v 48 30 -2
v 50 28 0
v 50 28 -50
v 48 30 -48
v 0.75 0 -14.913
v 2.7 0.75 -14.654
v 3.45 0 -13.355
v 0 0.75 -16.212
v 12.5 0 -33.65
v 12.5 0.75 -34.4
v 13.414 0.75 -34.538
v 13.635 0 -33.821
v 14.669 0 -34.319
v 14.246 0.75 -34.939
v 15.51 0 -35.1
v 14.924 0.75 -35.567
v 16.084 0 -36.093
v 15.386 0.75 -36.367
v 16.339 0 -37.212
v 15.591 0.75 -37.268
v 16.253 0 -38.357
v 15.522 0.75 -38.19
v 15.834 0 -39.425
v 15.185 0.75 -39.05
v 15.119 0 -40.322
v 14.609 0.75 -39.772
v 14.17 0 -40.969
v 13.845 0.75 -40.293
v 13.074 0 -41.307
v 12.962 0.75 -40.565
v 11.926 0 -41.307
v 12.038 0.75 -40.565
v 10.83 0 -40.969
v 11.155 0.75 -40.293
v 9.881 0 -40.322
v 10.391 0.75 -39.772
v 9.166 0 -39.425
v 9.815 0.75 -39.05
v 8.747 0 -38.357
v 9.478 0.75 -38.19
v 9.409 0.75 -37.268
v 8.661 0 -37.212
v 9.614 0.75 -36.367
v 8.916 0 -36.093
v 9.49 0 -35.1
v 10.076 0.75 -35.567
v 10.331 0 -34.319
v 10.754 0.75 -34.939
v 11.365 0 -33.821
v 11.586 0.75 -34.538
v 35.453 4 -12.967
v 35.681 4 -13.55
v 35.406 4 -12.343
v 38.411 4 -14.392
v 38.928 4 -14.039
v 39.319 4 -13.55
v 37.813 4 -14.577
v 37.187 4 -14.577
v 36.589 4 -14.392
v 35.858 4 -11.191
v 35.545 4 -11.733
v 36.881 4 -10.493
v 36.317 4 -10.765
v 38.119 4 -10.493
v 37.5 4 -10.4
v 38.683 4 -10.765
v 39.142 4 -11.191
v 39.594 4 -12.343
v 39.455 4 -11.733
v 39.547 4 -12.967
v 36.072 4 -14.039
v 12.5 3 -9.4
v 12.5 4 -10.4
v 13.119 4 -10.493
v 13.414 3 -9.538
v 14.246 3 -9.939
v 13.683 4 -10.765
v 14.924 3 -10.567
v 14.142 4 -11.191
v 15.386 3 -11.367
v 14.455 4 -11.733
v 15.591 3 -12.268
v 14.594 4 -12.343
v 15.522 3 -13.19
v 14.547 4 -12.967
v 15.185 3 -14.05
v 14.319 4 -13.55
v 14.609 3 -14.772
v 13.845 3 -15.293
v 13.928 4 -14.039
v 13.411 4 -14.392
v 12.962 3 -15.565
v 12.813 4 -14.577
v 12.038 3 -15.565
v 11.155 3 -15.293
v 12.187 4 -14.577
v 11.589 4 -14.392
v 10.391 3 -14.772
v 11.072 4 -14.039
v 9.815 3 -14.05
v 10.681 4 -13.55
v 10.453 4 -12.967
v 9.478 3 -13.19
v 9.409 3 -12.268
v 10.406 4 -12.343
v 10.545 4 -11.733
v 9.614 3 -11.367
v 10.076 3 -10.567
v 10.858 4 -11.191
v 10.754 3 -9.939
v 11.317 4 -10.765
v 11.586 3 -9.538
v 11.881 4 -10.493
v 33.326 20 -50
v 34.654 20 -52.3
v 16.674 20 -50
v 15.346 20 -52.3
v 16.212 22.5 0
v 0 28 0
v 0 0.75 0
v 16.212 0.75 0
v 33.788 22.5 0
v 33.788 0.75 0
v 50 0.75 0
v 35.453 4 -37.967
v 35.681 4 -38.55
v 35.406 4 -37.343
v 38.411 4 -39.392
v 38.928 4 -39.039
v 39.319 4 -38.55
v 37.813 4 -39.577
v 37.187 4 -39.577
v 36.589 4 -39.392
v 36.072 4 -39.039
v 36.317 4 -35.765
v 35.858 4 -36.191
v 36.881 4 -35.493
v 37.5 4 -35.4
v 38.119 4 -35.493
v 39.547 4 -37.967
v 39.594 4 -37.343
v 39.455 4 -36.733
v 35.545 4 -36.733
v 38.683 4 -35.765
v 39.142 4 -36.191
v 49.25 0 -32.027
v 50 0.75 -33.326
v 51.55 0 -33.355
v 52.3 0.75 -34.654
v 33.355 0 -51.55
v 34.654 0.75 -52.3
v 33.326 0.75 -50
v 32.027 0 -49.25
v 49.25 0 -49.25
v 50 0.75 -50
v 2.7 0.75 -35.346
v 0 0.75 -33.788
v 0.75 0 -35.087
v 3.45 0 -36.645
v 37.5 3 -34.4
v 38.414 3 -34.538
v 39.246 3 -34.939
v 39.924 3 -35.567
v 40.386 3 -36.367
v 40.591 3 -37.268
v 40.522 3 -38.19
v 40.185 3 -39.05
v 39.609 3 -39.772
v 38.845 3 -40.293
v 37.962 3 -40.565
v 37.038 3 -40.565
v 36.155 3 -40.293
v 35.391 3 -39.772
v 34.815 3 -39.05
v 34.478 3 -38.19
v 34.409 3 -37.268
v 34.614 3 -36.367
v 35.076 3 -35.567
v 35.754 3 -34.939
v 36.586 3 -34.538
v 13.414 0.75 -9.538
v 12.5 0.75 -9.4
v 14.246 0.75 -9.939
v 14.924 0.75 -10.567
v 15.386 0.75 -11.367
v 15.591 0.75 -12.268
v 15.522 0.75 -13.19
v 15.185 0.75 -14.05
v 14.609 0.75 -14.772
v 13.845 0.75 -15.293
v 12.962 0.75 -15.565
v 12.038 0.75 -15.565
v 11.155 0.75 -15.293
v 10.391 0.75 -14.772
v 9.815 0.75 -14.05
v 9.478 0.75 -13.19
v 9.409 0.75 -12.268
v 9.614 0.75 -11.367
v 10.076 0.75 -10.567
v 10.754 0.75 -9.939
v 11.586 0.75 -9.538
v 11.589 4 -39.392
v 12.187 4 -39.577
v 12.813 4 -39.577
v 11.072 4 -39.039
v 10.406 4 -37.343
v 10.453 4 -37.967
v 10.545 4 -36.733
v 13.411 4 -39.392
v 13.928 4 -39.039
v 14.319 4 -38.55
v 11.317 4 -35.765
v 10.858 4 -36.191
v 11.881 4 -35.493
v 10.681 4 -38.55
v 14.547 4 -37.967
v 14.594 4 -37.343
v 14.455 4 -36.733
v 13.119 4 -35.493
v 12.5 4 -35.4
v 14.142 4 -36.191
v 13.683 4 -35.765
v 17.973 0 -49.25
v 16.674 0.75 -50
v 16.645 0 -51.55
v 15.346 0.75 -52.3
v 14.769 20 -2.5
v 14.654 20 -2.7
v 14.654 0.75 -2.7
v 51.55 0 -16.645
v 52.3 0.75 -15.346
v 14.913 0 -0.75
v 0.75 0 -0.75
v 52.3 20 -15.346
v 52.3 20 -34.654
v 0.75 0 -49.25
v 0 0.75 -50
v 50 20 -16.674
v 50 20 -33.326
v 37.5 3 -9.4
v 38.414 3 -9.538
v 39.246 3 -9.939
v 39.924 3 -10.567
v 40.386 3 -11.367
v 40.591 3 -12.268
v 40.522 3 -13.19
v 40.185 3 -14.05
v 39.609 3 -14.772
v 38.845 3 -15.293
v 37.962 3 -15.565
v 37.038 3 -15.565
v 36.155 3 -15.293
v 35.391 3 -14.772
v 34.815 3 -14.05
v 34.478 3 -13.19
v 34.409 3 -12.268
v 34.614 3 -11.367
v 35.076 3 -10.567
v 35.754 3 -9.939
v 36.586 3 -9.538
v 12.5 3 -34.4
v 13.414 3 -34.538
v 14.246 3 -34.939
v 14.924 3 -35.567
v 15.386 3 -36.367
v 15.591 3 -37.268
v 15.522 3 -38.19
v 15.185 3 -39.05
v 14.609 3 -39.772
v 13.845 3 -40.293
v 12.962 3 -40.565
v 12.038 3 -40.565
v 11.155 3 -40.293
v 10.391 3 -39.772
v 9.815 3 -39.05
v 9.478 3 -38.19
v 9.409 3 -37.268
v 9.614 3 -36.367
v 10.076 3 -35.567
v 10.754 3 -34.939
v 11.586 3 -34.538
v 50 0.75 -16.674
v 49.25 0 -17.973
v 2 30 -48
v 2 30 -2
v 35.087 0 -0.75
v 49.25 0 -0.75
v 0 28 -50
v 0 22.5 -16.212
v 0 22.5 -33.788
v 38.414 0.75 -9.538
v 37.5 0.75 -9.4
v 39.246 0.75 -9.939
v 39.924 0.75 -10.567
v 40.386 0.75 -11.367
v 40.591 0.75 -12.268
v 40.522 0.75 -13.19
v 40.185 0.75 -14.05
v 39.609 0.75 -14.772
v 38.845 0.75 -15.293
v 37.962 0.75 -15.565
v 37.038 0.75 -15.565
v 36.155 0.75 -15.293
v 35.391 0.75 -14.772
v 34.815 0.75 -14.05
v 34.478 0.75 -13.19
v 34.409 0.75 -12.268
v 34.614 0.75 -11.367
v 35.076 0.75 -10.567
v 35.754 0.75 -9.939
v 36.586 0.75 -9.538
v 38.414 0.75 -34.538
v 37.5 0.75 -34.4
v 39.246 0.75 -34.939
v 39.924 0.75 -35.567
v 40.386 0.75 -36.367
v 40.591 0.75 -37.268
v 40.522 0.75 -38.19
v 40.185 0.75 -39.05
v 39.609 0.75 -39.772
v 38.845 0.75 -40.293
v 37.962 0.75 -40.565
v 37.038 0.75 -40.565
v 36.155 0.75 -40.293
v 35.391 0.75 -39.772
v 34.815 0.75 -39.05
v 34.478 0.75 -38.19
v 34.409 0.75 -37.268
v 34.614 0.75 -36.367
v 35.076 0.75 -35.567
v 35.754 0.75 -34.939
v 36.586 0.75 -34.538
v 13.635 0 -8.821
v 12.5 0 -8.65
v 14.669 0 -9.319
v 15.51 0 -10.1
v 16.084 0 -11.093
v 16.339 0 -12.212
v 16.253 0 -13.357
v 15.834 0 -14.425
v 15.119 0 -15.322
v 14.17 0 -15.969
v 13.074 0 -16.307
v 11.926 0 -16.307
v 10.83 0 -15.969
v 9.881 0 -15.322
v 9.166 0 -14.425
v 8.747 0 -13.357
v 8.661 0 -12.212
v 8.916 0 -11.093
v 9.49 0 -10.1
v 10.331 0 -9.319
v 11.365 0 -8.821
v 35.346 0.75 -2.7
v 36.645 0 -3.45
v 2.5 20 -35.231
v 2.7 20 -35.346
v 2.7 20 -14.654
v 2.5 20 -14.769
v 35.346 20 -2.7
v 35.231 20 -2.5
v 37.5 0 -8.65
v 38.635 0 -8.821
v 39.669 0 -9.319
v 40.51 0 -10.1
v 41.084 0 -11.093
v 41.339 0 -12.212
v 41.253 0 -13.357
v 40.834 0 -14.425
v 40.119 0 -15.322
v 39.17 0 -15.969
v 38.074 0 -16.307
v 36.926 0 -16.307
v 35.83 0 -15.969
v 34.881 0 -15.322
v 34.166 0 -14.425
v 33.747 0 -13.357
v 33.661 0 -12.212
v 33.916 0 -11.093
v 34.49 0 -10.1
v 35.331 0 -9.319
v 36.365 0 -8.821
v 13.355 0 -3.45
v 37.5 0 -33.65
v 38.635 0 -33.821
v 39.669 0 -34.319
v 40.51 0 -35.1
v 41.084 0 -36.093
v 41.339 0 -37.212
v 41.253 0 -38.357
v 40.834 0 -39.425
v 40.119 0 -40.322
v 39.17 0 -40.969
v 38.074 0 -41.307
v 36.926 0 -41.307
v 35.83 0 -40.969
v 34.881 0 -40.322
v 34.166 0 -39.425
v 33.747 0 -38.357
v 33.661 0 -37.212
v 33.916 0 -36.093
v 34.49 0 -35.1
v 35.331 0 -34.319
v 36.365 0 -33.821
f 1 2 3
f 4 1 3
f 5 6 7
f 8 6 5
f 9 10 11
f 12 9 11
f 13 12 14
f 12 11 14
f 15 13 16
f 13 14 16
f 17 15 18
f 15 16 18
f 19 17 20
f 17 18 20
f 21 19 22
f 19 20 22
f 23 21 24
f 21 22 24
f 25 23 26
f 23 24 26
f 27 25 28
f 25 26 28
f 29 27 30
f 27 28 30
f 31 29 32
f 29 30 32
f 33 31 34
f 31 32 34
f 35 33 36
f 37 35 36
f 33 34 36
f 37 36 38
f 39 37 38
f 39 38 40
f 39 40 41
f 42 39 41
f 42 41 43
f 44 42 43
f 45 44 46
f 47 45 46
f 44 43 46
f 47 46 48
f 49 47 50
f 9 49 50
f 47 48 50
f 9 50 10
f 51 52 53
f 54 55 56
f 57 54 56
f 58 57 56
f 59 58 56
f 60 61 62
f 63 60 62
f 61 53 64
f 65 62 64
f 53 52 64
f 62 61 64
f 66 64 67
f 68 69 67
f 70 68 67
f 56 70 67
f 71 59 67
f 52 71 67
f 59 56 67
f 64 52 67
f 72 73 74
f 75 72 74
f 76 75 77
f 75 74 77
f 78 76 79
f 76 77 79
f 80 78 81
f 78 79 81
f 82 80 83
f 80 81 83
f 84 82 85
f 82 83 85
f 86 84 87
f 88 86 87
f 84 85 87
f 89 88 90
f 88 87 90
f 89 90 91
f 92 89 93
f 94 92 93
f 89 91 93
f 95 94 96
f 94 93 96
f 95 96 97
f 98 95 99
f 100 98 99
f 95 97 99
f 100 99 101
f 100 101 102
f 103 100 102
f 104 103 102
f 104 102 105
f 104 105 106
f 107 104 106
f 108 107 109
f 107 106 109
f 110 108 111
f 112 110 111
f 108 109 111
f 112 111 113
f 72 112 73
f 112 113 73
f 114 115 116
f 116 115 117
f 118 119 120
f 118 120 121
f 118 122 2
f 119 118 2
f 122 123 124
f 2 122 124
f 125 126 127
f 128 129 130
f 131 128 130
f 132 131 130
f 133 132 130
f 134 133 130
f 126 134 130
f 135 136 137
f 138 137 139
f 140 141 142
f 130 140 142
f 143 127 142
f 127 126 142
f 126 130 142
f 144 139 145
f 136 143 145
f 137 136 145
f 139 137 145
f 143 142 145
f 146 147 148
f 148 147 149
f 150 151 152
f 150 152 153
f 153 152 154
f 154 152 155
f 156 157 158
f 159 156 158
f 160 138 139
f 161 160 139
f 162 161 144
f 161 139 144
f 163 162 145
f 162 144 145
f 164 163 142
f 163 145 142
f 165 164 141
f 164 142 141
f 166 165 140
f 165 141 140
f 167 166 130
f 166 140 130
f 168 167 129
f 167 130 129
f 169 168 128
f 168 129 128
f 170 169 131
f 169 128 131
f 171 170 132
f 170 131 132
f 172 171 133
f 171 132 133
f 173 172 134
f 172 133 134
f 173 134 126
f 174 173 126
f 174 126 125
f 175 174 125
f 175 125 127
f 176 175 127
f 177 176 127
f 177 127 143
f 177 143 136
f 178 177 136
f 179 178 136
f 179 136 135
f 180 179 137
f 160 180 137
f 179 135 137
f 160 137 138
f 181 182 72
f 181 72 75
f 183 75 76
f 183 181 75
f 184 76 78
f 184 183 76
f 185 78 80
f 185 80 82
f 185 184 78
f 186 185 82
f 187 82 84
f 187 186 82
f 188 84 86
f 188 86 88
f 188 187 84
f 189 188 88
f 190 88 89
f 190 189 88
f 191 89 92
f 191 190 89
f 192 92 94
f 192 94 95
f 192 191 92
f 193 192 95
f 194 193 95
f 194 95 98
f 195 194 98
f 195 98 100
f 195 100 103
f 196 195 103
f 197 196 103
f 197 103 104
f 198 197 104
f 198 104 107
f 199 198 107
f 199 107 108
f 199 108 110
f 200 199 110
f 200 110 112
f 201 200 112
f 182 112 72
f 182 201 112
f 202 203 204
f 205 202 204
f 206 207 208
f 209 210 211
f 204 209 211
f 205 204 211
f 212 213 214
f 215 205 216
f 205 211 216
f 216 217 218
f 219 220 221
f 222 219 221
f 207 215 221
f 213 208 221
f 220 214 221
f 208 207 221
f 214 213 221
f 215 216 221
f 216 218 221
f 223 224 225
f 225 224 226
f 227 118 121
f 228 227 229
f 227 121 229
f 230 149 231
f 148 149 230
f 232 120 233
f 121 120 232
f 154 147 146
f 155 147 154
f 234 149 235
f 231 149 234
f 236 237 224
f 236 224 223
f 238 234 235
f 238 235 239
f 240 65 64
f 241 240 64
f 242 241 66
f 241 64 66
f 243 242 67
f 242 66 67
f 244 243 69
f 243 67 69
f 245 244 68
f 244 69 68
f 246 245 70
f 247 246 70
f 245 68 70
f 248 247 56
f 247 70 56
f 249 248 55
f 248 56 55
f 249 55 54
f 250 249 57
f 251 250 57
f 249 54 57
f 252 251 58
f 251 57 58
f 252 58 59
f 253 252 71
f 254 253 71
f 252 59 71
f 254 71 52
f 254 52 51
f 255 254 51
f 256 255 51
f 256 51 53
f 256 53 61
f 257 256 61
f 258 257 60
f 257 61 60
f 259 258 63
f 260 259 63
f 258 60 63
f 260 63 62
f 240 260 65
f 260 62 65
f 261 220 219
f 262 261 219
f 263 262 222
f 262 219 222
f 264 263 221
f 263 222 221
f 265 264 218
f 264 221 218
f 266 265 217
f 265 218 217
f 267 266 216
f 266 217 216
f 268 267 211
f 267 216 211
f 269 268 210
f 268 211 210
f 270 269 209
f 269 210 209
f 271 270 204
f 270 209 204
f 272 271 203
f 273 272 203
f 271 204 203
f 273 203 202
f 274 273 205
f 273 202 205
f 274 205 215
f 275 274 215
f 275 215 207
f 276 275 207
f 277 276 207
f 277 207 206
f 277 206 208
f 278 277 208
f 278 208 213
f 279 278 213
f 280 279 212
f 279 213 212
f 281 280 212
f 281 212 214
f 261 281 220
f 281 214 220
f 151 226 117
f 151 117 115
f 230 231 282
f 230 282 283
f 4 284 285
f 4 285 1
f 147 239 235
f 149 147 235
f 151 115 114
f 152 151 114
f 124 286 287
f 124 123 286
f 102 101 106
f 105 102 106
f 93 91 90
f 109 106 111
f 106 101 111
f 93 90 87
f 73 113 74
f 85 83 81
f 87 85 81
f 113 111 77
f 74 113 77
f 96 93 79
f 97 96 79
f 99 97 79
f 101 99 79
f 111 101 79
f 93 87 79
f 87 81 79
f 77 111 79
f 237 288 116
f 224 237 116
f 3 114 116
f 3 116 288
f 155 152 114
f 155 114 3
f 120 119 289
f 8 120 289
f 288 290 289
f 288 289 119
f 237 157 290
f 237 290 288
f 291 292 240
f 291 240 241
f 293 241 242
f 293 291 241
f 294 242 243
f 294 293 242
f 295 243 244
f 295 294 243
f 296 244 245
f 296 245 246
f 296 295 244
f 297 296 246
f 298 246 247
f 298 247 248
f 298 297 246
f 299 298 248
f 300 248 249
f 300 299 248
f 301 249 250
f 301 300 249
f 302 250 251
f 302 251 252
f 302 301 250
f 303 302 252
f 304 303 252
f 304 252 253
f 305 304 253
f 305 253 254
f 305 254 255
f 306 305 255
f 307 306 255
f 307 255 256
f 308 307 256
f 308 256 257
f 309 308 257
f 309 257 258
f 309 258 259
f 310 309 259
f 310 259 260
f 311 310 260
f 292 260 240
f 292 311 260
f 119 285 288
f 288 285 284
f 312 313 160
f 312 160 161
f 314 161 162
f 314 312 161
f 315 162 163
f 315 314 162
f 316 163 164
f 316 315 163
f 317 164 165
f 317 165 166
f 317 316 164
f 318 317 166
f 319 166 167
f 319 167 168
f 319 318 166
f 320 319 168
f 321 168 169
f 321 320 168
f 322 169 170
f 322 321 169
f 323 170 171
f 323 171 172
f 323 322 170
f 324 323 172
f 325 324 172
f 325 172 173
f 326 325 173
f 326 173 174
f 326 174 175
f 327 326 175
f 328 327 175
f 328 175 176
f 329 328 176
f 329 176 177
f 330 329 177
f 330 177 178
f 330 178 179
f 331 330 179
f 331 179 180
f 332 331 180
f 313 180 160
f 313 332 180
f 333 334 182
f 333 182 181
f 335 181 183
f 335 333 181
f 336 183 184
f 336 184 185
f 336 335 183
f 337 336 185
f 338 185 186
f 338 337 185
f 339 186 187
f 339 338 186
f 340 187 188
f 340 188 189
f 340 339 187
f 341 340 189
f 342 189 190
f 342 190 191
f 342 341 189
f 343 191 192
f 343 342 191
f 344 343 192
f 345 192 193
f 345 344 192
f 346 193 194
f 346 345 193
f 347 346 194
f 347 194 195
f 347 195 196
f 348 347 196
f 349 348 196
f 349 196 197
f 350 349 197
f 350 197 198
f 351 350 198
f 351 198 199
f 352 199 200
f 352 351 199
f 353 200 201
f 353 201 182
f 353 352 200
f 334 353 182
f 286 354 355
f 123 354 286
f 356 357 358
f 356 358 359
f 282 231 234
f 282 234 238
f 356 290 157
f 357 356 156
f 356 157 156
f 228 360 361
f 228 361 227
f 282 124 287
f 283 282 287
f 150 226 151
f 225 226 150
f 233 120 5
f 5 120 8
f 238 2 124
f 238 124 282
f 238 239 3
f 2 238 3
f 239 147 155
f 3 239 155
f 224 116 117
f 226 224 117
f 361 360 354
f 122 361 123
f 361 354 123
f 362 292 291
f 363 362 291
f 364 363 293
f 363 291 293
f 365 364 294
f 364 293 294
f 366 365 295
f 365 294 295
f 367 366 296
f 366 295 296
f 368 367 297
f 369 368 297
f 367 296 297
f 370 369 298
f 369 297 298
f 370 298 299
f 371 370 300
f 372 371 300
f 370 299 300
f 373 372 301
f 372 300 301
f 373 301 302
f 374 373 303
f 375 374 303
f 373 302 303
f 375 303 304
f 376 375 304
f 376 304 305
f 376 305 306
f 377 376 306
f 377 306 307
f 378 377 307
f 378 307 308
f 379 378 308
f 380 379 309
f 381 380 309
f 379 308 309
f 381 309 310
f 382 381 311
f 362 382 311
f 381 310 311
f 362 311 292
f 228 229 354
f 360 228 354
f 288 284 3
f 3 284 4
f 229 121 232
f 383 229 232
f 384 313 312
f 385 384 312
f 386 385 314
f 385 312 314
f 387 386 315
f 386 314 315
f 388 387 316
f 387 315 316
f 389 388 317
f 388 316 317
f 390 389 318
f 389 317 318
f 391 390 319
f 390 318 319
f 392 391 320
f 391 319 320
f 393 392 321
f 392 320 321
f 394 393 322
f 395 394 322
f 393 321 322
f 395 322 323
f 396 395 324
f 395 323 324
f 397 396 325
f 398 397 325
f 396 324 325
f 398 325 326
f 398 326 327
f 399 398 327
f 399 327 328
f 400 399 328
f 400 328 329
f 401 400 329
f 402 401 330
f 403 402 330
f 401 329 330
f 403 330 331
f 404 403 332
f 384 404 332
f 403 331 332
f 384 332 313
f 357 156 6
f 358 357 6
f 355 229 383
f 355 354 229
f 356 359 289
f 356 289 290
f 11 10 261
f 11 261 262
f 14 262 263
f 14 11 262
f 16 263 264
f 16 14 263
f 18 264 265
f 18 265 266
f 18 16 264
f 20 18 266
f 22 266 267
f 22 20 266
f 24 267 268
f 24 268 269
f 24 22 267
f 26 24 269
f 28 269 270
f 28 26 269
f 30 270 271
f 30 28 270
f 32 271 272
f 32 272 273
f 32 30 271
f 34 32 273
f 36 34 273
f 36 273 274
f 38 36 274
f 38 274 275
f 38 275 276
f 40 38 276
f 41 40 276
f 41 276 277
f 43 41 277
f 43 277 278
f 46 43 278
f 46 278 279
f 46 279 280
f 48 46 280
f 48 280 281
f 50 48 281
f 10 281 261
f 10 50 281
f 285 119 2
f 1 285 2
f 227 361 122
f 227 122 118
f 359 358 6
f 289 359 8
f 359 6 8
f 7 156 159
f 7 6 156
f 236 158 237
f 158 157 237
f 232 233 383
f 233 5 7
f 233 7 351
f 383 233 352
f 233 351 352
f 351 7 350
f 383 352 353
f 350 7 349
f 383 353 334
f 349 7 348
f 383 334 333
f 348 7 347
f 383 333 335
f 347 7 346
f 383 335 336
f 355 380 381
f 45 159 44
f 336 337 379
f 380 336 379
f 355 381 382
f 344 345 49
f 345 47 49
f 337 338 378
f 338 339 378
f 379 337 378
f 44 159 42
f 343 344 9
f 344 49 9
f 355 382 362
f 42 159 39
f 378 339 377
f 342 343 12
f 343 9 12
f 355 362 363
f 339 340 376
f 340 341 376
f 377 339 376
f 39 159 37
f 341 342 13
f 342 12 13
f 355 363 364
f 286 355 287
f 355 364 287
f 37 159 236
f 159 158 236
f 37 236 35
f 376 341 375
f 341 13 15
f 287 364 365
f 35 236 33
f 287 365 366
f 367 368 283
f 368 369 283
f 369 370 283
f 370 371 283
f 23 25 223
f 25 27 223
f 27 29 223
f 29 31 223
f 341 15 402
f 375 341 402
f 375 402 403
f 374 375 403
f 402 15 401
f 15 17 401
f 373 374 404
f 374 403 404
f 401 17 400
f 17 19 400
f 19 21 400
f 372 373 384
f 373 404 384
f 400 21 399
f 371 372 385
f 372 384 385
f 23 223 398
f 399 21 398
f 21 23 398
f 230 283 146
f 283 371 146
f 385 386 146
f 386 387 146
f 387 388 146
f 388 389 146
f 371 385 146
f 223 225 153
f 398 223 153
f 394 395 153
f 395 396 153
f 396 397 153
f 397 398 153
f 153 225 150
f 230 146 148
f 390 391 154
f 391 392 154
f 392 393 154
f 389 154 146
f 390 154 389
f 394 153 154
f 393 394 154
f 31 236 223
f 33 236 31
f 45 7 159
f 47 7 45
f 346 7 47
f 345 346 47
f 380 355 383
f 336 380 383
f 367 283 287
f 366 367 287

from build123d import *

# Parameters (mm, degrees)
SKETCH1_W           = 50
SKETCH1_H           = 50
BOSS_EXTRUDE1_DEPTH = 30
BOSS_EXTRUDE2_DEPTH = 20
BOSS_EXTRUDE3_DEPTH = 20
CUT_EXTRUDE5_DEPTH  = 20
CUT_EXTRUDE6_DEPTH  = 20
CHAMFER1_SIZE       = 2
SKETCH4_R           = 3.1
CUT_EXTRUDE4_DEPTH  = 4
CHAMFER2_SIZE       = 1
CHAMFER3_SIZE       = 0.75
CHAMFER4_SIZE       = 2.5


with BuildPart() as part:
    # Sketch1 → Boss-Extrude1 (new body)
    with BuildSketch(Plane(origin=(0, 0, 0), x_dir=(1, 0, 0), z_dir=(0, 1, 0))):
        with Locations((25, 25)):
            Rectangle(SKETCH1_W, SKETCH1_H)
    extrude(amount=BOSS_EXTRUDE1_DEPTH)

    # Sketch3 → Boss-Extrude2 (add)
    with BuildSketch(Plane(origin=(0, 0, 0), x_dir=(1, 0, 0), z_dir=(0, 1, 0))):
        Polygon((50, 16.674315781), (50, 33.325684219), (52.3, 34.653589838), (52.3, 15.346410162), align=None)
    extrude(amount=BOSS_EXTRUDE2_DEPTH)

    # Sketch3<3> → Boss-Extrude3 (add)
    with BuildSketch(Plane(origin=(0, 0, 0), x_dir=(1, 0, 0), z_dir=(0, 1, 0))):
        Polygon((33.325684219, 50), (16.674315781, 50), (15.346410162, 52.3), (34.653589838, 52.3), align=None)
    extrude(amount=BOSS_EXTRUDE3_DEPTH)

    # Sketch3<6> → Cut-Extrude5 (cut)
    with BuildSketch(Plane(origin=(0, 0, 0), x_dir=(1, 0, 0), z_dir=(0, 1, 0))):
        Polygon((0, 33.787564435), (2.7, 35.346410162), (2.7, 14.653589838), (0, 16.212435565), align=None)
    extrude(amount=CUT_EXTRUDE5_DEPTH, mode=Mode.SUBTRACT)

    # Sketch3<7> → Cut-Extrude6 (cut)
    with BuildSketch(Plane(origin=(0, 0, 0), x_dir=(1, 0, 0), z_dir=(0, 1, 0))):
        Polygon((16.212435565, 0), (14.653589838, 2.7), (35.346410162, 2.7), (33.787564435, 0), align=None)
    extrude(amount=CUT_EXTRUDE6_DEPTH, mode=Mode.SUBTRACT)

    # Chamfer1
    chamfer1_edges = [part.edges().sort_by_distance(p)[0] for p in [
        (25, 30, -50),
        (50, 30, -25),
        (25, 30, 0),
        (0, 30, -25),
    ]]
    chamfer(chamfer1_edges, length=CHAMFER1_SIZE)

    # Sketch4 → Cut-Extrude4 (cut)
    with BuildSketch(Plane(origin=(0, 0, 0), x_dir=(1, 0, 0), z_dir=(0, 1, 0))):
        with Locations((12.5, 37.5)):
            Circle(SKETCH4_R)
        with Locations((37.5, 37.5)):
            Circle(SKETCH4_R)
        with Locations((37.5, 12.5)):
            Circle(SKETCH4_R)
        with Locations((12.5, 12.5)):
            Circle(SKETCH4_R)
    extrude(amount=CUT_EXTRUDE4_DEPTH, mode=Mode.SUBTRACT)

    # Chamfer2
    chamfer2_edges = [part.edges().sort_by_distance(p)[0] for p in [
        (34.4, 4, -12.5),
        (9.4, 4, -12.5),
        (9.4, 4, -37.5),
        (34.4, 4, -37.5),
    ]]
    chamfer(chamfer2_edges, length=CHAMFER2_SIZE)

    # Chamfer3
    chamfer3_edges = [part.edges().sort_by_distance(p)[0] for p in [
        (41.893782217, 0, 0),
        (50, 0, -8.33715789),
        (50, 0, -41.66284211),
        (41.66284211, 0, -50),
        (8.33715789, 0, -50),
        (0, 0, -41.893782217),
        (0, 0, -8.106217783),
        (8.106217783, 0, 0),
        (9.4, 0, -37.5),
        (34.4, 0, -37.5),
        (34.4, 0, -12.5),
        (9.4, 0, -12.5),
        (51.15, 0, -16.010362971),
        (52.3, 0, -25),
        (51.15, 0, -33.989637029),
        (33.989637029, 0, -51.15),
        (25, 0, -52.3),
        (16.010362971, 0, -51.15),
        (1.35, 0, -34.566987298),
        (2.7, 0, -25),
        (1.35, 0, -15.433012702),
        (15.433012702, 0, -1.35),
        (25, 0, -2.7),
        (34.566987298, 0, -1.35),
    ]]
    chamfer(chamfer3_edges, length=CHAMFER3_SIZE)

    # Chamfer4
    chamfer4_edges = [part.edges().sort_by_distance(p)[0] for p in [
        (25, 20, 0),
        (0, 20, -25),
    ]]
    chamfer(chamfer4_edges, length=CHAMFER4_SIZE)


solid = part.part
